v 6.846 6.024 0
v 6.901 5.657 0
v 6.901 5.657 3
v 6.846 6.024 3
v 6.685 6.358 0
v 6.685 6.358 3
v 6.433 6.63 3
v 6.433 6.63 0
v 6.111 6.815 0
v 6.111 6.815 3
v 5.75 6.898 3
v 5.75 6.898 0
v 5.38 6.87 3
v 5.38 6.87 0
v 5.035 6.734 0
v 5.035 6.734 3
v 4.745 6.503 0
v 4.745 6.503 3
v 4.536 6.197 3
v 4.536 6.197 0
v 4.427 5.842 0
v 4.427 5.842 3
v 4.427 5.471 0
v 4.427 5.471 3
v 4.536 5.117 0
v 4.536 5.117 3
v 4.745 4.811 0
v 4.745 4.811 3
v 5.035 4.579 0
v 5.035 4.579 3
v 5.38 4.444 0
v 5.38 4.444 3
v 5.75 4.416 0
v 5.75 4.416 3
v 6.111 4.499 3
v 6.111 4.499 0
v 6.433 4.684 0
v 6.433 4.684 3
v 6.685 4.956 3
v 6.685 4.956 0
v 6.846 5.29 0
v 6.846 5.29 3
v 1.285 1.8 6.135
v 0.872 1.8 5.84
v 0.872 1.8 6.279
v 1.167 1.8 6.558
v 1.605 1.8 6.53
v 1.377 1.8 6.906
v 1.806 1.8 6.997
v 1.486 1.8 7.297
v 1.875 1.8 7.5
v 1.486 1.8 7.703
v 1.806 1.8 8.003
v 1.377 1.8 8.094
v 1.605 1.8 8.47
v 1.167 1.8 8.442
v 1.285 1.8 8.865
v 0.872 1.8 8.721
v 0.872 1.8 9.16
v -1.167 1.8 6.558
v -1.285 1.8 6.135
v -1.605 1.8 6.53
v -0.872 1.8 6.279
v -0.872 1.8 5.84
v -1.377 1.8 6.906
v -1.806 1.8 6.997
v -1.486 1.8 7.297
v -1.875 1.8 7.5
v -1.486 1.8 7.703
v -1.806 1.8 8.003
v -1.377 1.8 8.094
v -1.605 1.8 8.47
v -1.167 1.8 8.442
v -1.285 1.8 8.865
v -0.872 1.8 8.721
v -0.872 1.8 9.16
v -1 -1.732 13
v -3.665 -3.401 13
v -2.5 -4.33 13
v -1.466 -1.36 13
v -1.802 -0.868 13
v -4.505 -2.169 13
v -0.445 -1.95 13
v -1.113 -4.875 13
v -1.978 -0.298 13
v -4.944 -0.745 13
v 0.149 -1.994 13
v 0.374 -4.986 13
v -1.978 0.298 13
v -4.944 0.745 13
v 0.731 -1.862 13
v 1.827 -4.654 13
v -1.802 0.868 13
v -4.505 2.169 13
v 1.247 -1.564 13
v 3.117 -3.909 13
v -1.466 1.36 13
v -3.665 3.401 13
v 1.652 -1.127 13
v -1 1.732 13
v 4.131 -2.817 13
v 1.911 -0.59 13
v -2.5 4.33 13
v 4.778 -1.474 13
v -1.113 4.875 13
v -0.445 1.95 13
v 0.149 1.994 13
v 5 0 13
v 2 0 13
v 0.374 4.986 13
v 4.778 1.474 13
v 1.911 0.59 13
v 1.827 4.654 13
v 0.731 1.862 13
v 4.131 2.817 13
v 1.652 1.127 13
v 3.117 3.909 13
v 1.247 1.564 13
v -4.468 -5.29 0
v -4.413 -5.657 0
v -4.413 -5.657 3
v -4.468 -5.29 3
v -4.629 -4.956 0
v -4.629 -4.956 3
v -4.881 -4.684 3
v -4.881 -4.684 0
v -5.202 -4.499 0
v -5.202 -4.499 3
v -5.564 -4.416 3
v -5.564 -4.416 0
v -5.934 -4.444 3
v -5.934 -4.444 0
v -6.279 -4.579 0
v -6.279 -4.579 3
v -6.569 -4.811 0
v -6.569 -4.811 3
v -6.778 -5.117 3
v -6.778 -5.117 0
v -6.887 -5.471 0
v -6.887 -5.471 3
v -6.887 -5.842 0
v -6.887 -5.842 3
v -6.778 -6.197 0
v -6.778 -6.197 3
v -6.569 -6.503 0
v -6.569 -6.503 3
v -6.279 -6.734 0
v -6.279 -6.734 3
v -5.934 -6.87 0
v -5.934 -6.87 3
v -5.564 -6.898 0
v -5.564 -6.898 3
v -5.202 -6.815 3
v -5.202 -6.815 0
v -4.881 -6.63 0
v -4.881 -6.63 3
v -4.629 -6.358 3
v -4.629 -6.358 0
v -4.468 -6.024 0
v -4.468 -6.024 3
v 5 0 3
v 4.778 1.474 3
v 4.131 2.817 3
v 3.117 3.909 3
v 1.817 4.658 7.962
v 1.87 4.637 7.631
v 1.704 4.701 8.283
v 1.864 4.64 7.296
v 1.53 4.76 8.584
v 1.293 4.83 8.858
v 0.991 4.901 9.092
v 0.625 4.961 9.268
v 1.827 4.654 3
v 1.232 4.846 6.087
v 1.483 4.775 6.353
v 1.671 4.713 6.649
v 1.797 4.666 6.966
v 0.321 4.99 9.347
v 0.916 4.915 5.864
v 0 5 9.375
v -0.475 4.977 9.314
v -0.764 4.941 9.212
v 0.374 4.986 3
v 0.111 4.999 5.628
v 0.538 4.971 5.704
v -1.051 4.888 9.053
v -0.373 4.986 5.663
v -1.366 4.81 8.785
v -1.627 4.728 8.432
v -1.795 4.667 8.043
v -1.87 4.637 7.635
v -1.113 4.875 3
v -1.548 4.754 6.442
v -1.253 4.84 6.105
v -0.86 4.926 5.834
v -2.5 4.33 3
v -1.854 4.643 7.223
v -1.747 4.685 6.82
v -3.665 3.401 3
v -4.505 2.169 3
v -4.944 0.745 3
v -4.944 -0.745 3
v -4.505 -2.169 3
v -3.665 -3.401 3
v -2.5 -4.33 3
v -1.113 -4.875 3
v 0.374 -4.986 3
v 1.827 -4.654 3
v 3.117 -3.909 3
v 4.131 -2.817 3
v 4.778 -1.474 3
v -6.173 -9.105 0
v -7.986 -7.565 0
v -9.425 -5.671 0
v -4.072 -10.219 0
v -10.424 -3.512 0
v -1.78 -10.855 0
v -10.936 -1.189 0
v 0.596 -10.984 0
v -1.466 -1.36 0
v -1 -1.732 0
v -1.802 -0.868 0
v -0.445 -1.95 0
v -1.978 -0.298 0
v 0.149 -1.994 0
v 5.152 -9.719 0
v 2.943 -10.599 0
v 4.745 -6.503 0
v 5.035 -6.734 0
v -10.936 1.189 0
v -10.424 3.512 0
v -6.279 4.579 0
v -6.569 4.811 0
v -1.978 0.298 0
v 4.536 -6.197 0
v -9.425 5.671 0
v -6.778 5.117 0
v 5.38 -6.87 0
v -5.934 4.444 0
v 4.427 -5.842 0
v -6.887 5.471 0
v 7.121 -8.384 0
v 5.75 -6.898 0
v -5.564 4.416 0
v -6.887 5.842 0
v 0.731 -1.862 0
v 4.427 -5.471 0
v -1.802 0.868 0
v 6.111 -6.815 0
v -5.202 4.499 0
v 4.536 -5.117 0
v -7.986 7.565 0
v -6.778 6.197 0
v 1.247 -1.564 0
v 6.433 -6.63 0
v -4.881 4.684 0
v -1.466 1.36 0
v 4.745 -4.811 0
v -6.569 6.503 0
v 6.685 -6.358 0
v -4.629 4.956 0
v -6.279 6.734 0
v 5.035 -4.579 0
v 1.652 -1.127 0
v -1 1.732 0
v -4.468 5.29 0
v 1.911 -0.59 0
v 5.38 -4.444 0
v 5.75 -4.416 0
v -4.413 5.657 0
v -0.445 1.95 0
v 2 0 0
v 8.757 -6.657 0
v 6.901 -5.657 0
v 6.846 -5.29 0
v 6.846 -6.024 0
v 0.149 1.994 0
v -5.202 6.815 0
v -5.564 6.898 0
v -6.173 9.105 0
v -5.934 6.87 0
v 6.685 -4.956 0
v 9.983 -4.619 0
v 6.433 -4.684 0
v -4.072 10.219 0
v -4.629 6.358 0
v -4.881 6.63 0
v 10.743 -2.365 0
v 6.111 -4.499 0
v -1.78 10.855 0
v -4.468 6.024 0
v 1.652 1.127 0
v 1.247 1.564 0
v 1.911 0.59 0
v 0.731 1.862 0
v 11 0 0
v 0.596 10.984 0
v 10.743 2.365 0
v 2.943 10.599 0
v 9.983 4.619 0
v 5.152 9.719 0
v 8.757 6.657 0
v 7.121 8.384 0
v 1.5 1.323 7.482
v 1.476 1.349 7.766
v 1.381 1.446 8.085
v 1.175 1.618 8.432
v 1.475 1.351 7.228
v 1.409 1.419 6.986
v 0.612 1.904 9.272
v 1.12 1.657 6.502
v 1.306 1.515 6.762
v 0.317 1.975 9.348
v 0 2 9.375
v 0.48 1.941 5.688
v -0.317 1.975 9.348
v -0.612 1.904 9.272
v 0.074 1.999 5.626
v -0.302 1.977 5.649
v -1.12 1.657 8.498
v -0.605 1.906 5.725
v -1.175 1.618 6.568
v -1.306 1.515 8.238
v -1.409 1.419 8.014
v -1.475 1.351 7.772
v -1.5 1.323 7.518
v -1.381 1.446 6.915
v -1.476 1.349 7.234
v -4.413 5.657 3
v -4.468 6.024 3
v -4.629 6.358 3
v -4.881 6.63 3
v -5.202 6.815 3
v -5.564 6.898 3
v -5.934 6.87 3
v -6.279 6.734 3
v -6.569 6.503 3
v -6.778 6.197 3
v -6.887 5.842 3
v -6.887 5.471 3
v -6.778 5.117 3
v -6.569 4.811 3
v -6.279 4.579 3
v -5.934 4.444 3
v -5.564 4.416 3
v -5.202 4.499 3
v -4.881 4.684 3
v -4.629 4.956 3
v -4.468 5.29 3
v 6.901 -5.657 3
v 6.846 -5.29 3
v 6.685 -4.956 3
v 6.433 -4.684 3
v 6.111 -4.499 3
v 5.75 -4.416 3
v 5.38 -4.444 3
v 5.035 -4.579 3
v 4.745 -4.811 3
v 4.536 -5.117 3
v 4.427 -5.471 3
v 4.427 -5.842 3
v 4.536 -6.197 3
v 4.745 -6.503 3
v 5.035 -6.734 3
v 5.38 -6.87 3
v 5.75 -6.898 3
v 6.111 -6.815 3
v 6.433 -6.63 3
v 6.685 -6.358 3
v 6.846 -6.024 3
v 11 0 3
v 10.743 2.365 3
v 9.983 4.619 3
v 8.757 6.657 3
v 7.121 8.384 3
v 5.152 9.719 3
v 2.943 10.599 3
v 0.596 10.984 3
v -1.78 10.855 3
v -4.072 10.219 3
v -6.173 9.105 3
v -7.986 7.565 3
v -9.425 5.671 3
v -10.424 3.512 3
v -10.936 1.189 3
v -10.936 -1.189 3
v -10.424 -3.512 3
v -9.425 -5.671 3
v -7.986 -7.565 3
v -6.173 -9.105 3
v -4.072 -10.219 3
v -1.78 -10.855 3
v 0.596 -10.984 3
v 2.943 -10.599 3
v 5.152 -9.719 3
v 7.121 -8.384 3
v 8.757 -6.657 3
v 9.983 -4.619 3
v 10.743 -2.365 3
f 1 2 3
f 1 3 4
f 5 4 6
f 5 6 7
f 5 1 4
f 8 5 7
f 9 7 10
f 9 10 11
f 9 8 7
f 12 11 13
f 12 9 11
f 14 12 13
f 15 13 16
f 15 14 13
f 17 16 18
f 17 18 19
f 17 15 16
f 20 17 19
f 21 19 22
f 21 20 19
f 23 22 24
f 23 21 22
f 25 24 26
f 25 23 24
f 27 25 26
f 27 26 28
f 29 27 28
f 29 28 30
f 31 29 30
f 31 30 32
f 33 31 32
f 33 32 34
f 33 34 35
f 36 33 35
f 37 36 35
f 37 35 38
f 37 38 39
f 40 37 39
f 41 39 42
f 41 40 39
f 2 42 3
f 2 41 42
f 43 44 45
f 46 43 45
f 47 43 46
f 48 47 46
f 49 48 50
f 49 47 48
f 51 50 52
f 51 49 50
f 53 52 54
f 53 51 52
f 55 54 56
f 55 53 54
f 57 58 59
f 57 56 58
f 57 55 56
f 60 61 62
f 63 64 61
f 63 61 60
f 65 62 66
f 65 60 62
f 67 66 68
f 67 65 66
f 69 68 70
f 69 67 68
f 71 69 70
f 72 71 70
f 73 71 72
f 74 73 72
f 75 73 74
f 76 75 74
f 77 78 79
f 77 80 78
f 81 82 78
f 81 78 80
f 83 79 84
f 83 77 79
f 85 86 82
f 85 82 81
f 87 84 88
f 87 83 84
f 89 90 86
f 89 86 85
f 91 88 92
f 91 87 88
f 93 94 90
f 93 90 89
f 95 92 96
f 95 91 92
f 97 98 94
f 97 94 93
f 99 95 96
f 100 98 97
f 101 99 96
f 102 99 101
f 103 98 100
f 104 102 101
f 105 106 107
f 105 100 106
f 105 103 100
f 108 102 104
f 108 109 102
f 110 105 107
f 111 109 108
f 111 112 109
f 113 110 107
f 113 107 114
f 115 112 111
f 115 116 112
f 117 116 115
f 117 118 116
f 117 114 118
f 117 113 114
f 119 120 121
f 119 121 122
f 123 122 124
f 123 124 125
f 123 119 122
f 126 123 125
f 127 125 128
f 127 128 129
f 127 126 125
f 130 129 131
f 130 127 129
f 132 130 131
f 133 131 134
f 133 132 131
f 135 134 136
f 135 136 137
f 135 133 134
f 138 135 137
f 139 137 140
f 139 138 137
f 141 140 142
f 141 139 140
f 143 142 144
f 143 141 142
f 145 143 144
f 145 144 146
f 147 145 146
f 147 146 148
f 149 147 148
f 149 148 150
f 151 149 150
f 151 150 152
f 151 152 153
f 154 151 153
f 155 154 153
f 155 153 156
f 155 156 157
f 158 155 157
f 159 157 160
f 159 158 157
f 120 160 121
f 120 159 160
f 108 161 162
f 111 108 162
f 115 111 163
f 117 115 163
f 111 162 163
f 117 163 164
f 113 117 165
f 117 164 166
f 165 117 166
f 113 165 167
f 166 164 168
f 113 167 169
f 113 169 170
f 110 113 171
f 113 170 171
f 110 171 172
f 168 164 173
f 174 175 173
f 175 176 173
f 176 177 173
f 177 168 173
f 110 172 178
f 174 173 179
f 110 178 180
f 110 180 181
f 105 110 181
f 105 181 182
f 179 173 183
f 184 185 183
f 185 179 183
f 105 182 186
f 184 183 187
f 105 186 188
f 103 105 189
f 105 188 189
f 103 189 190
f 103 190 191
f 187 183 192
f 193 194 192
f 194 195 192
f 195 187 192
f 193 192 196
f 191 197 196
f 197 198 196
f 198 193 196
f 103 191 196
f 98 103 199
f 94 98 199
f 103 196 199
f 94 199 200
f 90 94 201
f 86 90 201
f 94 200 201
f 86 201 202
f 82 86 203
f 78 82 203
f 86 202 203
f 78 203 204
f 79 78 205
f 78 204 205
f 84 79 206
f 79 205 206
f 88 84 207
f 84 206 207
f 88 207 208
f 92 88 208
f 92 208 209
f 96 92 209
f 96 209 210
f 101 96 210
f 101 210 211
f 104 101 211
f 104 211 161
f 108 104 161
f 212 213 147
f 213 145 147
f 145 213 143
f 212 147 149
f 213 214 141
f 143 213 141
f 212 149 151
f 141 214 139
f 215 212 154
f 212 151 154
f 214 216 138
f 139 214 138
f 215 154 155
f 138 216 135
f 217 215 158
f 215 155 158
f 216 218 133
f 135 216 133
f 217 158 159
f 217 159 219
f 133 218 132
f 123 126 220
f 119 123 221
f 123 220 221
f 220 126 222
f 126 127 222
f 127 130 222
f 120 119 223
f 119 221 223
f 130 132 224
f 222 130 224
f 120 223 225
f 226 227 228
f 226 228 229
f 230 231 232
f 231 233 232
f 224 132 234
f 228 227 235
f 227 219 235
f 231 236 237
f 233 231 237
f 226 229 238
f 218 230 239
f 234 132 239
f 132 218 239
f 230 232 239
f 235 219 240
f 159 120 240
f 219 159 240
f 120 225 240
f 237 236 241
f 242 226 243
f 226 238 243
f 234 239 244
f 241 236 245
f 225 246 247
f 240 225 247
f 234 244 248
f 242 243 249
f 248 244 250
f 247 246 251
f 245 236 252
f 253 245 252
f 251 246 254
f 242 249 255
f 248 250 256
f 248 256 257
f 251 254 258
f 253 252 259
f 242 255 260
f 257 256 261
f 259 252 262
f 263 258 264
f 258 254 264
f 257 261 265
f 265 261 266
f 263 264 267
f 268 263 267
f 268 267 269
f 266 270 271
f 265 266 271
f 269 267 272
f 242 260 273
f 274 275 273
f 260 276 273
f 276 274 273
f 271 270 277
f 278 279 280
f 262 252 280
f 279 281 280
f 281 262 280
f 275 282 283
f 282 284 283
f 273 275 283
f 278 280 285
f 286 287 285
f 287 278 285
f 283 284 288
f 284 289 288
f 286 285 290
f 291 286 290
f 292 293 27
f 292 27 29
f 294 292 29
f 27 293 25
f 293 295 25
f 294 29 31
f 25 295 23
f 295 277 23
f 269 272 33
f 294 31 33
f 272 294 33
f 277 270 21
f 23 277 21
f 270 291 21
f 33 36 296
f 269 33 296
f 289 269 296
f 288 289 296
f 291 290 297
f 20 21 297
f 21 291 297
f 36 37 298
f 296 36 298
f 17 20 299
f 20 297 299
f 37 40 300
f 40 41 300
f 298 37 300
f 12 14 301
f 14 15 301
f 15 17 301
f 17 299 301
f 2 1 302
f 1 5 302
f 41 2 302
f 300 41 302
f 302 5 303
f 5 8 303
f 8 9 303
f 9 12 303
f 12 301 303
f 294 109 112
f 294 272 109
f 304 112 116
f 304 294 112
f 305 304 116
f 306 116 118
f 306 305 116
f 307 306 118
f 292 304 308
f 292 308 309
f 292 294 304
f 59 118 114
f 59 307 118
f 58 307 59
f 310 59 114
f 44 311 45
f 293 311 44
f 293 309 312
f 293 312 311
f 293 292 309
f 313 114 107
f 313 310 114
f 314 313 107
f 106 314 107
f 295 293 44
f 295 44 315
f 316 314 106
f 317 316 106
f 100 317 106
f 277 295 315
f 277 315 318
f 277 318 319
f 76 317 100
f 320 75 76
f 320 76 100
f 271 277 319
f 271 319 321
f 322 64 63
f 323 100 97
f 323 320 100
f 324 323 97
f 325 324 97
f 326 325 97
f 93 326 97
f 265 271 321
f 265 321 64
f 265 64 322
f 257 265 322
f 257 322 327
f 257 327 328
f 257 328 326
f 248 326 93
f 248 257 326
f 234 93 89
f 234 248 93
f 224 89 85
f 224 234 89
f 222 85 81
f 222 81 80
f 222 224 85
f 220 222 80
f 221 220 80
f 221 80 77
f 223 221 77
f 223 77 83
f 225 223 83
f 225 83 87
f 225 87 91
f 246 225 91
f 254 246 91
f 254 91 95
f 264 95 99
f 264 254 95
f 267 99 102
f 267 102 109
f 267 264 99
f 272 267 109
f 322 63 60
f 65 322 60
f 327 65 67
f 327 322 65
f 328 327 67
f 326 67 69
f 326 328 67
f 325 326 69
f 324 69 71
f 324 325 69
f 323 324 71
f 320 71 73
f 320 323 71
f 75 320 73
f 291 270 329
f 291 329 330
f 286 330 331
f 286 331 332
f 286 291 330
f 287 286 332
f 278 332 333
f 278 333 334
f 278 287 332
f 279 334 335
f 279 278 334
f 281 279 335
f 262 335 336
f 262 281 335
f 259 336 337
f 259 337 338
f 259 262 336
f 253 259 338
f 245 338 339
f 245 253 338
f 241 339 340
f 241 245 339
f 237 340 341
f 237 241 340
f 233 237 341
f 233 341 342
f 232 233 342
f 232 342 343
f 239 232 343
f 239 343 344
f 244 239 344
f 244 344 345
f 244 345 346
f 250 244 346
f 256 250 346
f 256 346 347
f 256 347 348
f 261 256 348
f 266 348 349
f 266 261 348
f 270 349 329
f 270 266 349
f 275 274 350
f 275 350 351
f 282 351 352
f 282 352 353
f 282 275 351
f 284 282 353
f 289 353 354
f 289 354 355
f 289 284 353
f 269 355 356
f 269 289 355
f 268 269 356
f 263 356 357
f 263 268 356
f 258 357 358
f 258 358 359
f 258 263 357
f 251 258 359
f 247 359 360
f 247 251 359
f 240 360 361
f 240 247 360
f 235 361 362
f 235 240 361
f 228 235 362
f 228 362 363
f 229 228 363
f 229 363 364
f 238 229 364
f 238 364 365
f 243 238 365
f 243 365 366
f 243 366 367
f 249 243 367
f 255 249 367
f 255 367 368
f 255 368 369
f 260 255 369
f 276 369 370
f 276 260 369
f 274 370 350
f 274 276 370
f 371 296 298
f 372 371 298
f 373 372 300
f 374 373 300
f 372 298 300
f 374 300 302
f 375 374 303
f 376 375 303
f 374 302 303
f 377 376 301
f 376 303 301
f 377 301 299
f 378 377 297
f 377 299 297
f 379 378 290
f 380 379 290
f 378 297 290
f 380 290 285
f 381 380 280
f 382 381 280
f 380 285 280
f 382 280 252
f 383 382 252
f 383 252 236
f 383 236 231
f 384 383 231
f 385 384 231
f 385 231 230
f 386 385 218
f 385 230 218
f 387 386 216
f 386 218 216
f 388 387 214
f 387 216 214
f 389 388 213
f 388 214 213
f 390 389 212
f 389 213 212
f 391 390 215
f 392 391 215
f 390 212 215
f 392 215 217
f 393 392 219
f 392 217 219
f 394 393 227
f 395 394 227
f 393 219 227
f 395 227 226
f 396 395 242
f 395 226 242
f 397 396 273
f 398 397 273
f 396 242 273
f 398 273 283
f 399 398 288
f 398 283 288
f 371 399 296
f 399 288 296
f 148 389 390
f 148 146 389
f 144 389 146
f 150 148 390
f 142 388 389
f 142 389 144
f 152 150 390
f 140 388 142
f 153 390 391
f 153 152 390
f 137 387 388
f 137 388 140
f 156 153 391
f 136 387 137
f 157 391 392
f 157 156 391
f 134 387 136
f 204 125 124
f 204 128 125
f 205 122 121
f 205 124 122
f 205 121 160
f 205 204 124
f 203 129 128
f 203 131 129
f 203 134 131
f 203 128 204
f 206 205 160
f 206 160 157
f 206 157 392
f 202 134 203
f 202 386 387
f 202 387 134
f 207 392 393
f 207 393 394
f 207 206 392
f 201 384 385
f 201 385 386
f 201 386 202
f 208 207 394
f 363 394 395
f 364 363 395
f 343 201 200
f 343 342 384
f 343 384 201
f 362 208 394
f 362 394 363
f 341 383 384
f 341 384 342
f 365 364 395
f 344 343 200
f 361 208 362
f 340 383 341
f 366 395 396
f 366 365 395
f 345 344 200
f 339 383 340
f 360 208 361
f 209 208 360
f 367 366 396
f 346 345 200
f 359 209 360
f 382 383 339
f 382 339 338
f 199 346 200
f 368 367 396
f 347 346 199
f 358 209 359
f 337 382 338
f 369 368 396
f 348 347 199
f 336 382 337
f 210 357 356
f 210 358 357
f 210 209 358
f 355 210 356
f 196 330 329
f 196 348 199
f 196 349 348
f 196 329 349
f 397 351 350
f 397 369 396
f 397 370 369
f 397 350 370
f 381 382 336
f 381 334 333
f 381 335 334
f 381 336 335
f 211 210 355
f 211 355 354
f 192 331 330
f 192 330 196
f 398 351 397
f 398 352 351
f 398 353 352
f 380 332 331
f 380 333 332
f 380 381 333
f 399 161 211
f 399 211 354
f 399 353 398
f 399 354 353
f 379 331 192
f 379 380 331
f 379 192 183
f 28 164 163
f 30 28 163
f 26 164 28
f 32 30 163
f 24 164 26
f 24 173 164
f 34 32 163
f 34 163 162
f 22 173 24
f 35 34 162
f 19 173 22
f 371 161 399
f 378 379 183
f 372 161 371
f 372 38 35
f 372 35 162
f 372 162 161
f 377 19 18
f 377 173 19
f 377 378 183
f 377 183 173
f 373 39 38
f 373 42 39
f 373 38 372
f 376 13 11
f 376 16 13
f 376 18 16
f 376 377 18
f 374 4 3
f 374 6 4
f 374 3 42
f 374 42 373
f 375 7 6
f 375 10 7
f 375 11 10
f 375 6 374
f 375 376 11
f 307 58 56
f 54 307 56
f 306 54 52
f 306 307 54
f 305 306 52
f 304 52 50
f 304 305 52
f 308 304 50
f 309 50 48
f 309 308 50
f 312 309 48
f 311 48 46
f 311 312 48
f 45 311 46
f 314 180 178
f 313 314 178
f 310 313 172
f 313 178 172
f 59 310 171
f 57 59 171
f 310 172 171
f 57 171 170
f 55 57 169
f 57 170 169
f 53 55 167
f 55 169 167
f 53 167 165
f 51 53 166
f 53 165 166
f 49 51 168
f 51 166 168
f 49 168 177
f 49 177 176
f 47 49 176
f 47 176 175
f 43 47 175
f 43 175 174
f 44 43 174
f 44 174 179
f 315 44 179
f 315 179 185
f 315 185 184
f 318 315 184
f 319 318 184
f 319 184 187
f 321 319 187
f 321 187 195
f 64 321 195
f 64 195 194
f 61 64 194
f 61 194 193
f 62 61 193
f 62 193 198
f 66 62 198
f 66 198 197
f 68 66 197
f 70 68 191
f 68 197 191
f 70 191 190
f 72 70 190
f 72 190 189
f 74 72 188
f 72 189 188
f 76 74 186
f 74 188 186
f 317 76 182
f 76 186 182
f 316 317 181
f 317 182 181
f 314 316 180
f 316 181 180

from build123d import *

# Parameters (mm, degrees)
SKETCH2_R           = 11
SKETCH2_R_2         = 2
SKETCH2_R_3         = 1.244152151
BOSS_EXTRUDE1_DEPTH = 3
SKETCH3_R           = 5
SKETCH3_R_2         = 2
BOSS_EXTRUDE3_DEPTH = 10
CUT_EXTRUDE2_START  = 5
SKETCH6_R           = 1.875
CUT_EXTRUDE2_DEPTH  = 3.2
SKETCH10_R          = 1.5
CUT_EXTRUDE3_DEPTH  = 3


with BuildPart() as part:
    # Sketch2 → Boss-Extrude1 (new body)
    with BuildSketch(Plane.XY):
        Circle(SKETCH2_R)
        Circle(SKETCH2_R_2, mode=Mode.SUBTRACT)
        with Locations((-5.656854249, 5.656854249)):
            Circle(SKETCH2_R_3, mode=Mode.SUBTRACT)
        with Locations((5.656854249, 5.656854249)):
            Circle(SKETCH2_R_3, mode=Mode.SUBTRACT)
        with Locations((5.656854249, -5.656854249)):
            Circle(SKETCH2_R_3, mode=Mode.SUBTRACT)
        with Locations((-5.656854249, -5.656854249)):
            Circle(SKETCH2_R_3, mode=Mode.SUBTRACT)
    extrude(amount=BOSS_EXTRUDE1_DEPTH)

    # Sketch3 → Boss-Extrude3 (add)
    with BuildSketch(Plane.XY.offset(3)):
        Circle(SKETCH3_R)
        Circle(SKETCH3_R_2, mode=Mode.SUBTRACT)
    extrude(amount=BOSS_EXTRUDE3_DEPTH)

    # Sketch6 → Cut-Extrude2 (cut)
    with BuildSketch(Plane(origin=(0, 0, 0), x_dir=(1, 0, 0), z_dir=(0, 1, 0)).offset(CUT_EXTRUDE2_START)):
        with Locations(Location((0, -7.5, 0), (0, 0, 270))):
            Circle(SKETCH6_R)
    extrude(amount=-CUT_EXTRUDE2_DEPTH, mode=Mode.SUBTRACT)

    # Sketch10 → Cut-Extrude3 (cut)
    with BuildSketch(Plane(origin=(0, 0, 0), x_dir=(1, 0, 0), z_dir=(0, 1, 0))):
        with Locations((0, -7.5)):
            Circle(SKETCH10_R)
    extrude(amount=CUT_EXTRUDE3_DEPTH, mode=Mode.SUBTRACT)


solid = part.part
